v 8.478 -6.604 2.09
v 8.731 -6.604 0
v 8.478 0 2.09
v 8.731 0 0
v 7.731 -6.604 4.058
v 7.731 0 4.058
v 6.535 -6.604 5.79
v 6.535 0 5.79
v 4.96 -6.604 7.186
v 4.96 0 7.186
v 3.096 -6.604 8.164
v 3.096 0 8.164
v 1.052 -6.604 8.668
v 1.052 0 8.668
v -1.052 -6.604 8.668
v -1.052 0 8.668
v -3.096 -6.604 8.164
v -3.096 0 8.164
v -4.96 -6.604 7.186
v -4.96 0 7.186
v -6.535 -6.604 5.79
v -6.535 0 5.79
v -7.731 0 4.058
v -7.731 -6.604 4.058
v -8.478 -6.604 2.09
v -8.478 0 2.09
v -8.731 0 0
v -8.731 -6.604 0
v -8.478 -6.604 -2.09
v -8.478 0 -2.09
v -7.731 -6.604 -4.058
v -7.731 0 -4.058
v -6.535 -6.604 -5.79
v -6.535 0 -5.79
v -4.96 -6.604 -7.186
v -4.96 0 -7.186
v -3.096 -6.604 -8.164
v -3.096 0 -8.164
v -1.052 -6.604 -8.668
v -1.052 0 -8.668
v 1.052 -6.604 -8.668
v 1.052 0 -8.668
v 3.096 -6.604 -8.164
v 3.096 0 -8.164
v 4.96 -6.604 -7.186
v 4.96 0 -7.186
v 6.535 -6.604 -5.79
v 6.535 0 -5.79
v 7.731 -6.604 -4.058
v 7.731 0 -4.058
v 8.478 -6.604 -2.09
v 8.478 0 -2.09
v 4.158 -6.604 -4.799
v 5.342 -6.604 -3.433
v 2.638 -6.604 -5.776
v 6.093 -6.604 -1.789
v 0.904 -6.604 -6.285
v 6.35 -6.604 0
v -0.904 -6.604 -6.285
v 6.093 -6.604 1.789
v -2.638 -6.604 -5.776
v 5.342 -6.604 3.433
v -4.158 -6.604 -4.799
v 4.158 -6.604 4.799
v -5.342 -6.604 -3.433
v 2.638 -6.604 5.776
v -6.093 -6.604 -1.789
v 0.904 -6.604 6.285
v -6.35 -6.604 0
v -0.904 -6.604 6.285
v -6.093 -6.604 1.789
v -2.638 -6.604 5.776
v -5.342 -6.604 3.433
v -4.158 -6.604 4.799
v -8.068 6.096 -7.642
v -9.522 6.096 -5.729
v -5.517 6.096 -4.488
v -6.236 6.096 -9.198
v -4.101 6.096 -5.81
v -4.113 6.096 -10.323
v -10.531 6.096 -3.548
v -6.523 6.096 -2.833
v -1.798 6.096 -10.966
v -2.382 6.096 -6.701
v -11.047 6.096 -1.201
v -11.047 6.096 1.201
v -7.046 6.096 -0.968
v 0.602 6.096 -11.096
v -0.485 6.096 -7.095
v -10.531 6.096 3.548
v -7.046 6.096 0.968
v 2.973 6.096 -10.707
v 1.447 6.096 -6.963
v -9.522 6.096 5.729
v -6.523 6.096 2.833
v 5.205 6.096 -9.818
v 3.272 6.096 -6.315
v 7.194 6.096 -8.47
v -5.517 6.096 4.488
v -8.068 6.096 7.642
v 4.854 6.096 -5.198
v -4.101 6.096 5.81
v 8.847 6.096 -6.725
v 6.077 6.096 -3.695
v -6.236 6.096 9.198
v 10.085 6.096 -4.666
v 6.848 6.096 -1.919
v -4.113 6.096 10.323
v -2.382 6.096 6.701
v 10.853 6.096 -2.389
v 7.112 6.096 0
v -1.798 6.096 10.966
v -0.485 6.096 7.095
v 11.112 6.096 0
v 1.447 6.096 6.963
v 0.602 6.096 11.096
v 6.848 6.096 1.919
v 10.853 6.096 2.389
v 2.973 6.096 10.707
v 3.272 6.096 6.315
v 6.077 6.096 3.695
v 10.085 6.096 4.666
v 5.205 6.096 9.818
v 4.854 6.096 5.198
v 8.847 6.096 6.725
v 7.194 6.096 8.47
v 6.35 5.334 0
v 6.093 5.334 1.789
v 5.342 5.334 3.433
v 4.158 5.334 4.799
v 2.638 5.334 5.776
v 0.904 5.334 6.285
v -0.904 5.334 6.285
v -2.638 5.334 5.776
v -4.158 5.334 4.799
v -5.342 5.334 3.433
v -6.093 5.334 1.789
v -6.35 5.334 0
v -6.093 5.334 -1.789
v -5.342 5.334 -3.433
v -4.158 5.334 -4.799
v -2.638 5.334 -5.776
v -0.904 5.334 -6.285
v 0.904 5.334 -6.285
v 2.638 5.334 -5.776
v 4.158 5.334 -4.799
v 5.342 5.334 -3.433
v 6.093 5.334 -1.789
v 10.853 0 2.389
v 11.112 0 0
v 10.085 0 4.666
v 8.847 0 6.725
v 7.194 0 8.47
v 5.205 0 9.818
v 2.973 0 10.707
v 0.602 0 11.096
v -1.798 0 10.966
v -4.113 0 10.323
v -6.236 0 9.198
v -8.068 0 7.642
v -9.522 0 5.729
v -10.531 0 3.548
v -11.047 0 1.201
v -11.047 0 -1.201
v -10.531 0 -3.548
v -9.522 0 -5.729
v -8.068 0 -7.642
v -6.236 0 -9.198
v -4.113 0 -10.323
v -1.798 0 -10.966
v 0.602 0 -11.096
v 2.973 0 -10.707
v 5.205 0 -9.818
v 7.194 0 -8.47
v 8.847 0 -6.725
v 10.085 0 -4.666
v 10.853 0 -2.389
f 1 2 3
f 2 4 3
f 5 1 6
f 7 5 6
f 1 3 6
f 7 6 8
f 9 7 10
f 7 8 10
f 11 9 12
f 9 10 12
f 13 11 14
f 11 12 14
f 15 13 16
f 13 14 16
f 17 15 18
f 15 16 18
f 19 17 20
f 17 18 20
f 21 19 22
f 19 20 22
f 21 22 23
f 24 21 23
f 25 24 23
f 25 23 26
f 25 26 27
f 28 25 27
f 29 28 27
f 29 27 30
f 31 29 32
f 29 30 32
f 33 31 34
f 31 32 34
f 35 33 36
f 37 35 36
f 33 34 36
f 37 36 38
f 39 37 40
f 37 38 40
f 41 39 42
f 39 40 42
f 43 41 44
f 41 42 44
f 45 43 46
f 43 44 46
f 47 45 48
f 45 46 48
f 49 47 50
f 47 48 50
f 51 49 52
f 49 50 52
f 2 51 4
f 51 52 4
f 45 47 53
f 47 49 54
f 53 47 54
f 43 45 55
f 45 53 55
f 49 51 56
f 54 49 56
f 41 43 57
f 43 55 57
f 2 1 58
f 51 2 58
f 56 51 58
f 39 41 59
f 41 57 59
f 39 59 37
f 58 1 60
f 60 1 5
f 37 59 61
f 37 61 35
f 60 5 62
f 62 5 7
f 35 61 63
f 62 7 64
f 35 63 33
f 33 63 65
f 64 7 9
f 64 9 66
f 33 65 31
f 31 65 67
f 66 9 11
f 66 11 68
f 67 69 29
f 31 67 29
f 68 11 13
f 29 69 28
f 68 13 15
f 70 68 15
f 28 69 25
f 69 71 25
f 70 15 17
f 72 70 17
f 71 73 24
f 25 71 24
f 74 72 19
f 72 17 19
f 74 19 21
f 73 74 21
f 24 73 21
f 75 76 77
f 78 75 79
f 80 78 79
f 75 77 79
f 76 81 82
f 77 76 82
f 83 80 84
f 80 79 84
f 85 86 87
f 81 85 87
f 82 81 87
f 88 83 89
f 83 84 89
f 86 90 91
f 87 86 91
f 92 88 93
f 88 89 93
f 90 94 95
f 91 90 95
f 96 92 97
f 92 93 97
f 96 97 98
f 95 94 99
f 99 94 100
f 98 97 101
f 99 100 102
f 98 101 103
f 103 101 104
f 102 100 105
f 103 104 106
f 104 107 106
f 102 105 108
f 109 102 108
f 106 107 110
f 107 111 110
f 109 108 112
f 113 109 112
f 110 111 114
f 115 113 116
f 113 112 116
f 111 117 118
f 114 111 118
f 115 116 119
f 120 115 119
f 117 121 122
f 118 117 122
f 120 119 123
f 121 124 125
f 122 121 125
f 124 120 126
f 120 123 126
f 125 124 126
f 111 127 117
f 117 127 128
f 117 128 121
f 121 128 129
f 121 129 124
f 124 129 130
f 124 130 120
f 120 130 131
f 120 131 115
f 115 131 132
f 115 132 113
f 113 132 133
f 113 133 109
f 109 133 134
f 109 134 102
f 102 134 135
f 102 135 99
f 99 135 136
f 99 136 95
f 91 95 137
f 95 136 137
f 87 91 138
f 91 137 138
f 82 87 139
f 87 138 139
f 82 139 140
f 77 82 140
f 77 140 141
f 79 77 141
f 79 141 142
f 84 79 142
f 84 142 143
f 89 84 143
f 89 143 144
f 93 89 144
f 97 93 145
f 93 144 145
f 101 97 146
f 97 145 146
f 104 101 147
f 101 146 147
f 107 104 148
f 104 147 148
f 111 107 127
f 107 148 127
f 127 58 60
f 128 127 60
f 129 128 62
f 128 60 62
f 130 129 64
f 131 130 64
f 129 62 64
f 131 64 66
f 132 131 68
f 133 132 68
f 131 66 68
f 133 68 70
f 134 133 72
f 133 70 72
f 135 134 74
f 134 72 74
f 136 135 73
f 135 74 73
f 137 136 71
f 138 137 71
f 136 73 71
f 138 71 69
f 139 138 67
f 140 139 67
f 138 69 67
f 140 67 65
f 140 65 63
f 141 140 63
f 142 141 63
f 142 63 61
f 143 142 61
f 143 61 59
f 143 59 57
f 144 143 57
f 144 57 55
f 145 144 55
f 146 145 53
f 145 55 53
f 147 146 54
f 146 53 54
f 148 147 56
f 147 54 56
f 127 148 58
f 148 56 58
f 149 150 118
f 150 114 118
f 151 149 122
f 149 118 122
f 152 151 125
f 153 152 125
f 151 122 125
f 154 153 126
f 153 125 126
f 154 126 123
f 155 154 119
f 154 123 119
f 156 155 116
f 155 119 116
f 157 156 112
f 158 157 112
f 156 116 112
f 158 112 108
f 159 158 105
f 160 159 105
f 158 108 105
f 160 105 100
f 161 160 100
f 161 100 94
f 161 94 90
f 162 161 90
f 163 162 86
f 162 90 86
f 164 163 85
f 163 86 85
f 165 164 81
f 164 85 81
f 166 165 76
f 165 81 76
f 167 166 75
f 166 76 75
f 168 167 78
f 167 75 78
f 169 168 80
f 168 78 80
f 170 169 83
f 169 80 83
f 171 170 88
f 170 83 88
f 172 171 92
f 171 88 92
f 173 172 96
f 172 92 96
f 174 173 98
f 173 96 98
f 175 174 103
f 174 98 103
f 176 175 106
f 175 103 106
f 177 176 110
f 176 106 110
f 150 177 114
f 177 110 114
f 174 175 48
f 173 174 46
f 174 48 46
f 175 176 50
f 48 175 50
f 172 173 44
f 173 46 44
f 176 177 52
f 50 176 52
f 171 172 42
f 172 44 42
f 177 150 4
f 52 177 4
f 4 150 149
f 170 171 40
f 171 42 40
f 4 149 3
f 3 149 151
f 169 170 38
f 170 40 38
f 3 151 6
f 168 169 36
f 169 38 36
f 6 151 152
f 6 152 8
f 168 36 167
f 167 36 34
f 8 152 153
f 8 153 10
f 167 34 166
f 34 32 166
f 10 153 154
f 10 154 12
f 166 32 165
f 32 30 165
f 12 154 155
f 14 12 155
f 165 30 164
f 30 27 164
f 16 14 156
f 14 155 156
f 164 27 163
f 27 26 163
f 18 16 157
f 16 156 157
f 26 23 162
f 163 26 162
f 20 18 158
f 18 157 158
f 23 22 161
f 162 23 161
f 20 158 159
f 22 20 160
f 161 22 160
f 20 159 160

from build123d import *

# Parameters (mm, degrees)
CHAMFER1_SIZE = 0.762


with BuildPart() as part:
    # Sketch1 → Revolve1 (revolve)
    with BuildSketch(Plane.XY):
        Polygon((8.73125, 0), (11.1125, 0), (11.1125, 6.096), (6.35, 6.096), (6.35, -6.604), (8.73125, -6.604), align=None)
    revolve(axis=Axis((0, 0, 0), (0, -1, 0)))

    # Chamfer1
    chamfer1_edges = [part.edges().sort_by_distance(p)[0] for p in [
        (-6.35, 6.096, 0),
    ]]
    chamfer(chamfer1_edges, length=CHAMFER1_SIZE)


solid = part.part
